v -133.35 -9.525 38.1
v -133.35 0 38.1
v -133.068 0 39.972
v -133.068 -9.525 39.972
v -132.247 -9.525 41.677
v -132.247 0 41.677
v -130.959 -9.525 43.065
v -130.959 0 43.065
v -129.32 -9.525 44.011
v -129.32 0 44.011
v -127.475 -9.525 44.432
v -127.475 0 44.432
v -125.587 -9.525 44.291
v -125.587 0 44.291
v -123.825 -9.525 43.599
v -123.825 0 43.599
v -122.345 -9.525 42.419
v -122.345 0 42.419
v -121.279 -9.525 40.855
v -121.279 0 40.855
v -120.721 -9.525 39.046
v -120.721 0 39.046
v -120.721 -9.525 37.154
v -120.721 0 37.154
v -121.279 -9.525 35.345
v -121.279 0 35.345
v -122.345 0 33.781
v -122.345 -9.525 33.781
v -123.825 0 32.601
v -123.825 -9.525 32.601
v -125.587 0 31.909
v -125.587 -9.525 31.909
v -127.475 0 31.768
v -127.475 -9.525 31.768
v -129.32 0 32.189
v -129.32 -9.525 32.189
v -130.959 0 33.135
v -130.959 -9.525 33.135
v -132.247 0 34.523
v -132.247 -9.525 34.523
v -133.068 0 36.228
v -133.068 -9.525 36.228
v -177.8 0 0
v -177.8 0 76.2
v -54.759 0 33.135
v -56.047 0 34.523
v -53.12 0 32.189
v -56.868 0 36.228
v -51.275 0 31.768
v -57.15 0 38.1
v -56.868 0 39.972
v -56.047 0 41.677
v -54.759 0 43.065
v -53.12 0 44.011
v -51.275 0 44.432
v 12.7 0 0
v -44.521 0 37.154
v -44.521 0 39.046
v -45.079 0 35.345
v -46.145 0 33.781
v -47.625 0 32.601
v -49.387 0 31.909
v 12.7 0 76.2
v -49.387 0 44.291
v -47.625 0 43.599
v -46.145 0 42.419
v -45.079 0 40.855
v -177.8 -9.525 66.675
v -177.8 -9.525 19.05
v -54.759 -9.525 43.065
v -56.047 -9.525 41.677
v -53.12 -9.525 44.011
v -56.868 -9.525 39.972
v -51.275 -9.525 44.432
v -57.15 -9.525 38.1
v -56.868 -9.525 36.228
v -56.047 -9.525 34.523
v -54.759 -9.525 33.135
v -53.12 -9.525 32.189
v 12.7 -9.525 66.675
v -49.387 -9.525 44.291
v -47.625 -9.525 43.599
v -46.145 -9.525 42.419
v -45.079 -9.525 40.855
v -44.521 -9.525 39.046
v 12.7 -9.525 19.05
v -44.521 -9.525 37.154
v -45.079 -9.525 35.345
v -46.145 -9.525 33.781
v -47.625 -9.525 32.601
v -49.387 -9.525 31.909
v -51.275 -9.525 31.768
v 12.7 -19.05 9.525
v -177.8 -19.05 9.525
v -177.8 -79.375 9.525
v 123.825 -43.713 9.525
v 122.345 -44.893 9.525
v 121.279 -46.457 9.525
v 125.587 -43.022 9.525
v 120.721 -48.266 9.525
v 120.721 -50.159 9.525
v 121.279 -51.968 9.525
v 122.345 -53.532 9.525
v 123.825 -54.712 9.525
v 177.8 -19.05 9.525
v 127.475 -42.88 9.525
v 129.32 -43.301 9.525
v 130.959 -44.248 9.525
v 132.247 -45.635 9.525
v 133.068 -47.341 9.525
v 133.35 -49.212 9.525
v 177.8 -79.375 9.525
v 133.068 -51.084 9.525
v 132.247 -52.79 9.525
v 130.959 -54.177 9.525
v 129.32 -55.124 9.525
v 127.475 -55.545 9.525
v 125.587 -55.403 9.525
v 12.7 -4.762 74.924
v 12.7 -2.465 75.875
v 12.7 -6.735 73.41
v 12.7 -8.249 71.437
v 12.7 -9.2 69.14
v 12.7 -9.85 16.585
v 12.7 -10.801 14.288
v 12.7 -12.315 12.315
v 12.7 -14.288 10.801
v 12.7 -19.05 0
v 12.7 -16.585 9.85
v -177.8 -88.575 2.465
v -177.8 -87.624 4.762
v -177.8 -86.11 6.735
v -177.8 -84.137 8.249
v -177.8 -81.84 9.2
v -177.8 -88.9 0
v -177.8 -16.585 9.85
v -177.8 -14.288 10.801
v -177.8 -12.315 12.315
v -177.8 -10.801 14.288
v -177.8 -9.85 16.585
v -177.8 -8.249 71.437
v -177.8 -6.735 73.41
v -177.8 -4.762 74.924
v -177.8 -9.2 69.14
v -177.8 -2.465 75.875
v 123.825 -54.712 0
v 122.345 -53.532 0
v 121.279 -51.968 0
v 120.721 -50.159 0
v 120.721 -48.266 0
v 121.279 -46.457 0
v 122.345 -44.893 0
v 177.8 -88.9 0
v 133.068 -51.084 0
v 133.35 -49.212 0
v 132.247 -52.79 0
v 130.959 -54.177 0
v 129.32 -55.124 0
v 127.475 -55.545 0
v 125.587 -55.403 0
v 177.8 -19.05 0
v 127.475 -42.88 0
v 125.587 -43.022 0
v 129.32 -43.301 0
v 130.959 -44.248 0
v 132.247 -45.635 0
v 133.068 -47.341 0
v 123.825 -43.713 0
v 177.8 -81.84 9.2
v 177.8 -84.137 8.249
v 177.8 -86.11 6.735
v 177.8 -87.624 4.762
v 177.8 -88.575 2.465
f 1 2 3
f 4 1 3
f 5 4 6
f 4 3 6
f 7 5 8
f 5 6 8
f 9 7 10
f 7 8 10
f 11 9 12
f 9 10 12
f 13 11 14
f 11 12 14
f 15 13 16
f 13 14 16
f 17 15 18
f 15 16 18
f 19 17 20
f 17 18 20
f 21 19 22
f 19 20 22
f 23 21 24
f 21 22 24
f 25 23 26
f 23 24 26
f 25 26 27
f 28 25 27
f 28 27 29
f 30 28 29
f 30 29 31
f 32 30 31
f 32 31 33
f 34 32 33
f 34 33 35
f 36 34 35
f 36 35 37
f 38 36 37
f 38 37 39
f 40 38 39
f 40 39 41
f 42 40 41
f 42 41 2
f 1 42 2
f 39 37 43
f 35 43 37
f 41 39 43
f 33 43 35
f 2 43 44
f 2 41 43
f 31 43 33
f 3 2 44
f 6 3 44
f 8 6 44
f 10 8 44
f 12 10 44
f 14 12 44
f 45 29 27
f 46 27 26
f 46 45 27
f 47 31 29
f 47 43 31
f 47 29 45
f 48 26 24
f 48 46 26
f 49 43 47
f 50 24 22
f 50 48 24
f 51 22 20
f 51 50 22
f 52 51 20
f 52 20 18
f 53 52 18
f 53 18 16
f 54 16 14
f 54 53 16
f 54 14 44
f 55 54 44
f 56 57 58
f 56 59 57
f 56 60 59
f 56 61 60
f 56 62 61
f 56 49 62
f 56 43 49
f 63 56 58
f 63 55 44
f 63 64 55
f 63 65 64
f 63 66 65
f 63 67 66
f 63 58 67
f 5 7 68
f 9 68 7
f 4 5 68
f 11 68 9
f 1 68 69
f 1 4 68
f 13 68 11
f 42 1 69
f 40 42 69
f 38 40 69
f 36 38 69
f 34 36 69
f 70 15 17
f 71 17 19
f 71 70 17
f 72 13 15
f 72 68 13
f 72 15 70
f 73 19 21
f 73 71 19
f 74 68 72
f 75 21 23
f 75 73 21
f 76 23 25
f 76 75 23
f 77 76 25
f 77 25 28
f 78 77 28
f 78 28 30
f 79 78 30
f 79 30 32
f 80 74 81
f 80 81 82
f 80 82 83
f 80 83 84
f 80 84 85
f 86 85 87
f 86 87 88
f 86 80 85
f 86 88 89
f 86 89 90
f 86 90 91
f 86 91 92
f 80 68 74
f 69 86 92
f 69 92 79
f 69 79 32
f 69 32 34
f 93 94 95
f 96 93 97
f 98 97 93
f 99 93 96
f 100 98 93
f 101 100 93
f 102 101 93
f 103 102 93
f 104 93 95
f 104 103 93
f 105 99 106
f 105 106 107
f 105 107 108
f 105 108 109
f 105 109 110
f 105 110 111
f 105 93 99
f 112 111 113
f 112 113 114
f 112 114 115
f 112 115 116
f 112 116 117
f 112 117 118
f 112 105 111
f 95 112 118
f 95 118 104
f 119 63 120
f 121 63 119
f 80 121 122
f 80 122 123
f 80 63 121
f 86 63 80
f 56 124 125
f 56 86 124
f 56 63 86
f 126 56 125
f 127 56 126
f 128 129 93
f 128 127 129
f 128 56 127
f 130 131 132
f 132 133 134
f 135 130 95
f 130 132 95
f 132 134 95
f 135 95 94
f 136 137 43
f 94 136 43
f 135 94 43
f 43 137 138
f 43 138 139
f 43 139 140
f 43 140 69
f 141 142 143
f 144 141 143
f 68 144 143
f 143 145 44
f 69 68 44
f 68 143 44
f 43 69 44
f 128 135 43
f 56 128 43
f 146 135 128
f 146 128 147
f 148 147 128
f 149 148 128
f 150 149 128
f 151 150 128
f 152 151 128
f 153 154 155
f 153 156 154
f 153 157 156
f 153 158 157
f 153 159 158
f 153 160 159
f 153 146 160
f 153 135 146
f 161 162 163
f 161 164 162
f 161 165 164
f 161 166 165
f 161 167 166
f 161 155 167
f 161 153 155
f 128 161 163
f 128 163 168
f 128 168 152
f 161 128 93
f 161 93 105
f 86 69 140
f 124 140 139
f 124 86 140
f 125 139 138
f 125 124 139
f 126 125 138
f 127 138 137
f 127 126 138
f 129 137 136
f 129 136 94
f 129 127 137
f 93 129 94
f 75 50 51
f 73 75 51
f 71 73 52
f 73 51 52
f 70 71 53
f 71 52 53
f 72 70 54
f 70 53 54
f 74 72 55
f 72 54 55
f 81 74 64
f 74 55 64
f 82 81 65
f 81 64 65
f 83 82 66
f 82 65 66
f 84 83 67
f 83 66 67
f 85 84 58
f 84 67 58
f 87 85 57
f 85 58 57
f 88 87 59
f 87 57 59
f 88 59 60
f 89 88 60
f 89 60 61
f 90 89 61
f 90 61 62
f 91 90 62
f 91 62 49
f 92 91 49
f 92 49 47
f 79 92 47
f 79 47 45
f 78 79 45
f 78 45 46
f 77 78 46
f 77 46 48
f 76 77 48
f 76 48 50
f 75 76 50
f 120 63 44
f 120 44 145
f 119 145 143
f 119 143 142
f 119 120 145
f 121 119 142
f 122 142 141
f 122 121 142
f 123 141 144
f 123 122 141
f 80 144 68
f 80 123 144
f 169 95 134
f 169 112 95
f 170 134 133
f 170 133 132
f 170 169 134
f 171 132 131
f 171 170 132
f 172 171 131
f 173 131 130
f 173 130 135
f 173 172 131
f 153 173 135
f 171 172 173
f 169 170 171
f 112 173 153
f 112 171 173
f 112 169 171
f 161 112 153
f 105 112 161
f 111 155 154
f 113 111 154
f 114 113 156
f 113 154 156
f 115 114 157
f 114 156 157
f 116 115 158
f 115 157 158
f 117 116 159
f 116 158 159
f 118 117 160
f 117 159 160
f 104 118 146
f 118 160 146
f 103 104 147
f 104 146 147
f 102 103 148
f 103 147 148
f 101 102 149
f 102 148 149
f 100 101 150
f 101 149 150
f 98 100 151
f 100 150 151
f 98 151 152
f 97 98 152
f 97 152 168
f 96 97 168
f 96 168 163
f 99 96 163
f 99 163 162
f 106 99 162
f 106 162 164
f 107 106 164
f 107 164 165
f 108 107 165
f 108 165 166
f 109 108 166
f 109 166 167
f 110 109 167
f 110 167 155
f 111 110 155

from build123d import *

# Parameters (mm, degrees)
F1_DEPTH = 177.8
F2_R     = 6.35
F3_DEPTH = 25.4
F4_W     = 165.1
F4_H     = 19.05
F5_DEPTH = 76.201
F6_R     = 6.35
F7_DEPTH = 25.4


with BuildPart() as f1:
    # F0 (on Right) → F1 (new body, symmetric)
    with BuildSketch(Plane.YZ):
        with BuildLine():
            Line((0, 0), (0, 76.2))
            ThreePointArc((0, 76.2), (-6.7351920908, 73.4101920908), (-9.525, 66.675))
            Line((-9.525, 66.675), (-9.525, 19.05))
            ThreePointArc((-9.525, 19.05), (-12.3148079092, 12.3148079092), (-19.05, 9.525))
            Line((-19.05, 9.525), (-79.375, 9.525))
            ThreePointArc((-79.375, 9.525), (-86.1101920908, 6.7351920908), (-88.9, 0))
            Line((-88.9, 0), (0, 0))
        make_face()
    extrude(amount=F1_DEPTH, both=True)

    # F2 (on face) → F3 (cut)
    with BuildSketch(Plane(origin=(0, 0, 0), x_dir=(-1, 0, 0), z_dir=(0, 1, 0))):
        with Locations((127, 38.1)):
            Circle(F2_R)
        with Locations((50.8, 38.1)):
            Circle(F2_R)
    extrude(amount=-F3_DEPTH, mode=Mode.SUBTRACT)

    # F4 (on face) → F5 (cut, through all)
    with BuildSketch(Plane(origin=(0, 0, 0), x_dir=(1, 0, 0), z_dir=(0, 0, -1))):
        with Locations((95.25, 9.525)):
            Rectangle(F4_W, F4_H)
    extrude(amount=-F5_DEPTH, mode=Mode.SUBTRACT)

    # F6 (on face) → F7 (cut)
    with BuildSketch(Plane(origin=(0, 0, 0), x_dir=(1, 0, 0), z_dir=(0, 0, -1))):
        with Locations((127, 49.2125)):
            Circle(F6_R)
    extrude(amount=-F7_DEPTH, mode=Mode.SUBTRACT)


solid = f1.part
